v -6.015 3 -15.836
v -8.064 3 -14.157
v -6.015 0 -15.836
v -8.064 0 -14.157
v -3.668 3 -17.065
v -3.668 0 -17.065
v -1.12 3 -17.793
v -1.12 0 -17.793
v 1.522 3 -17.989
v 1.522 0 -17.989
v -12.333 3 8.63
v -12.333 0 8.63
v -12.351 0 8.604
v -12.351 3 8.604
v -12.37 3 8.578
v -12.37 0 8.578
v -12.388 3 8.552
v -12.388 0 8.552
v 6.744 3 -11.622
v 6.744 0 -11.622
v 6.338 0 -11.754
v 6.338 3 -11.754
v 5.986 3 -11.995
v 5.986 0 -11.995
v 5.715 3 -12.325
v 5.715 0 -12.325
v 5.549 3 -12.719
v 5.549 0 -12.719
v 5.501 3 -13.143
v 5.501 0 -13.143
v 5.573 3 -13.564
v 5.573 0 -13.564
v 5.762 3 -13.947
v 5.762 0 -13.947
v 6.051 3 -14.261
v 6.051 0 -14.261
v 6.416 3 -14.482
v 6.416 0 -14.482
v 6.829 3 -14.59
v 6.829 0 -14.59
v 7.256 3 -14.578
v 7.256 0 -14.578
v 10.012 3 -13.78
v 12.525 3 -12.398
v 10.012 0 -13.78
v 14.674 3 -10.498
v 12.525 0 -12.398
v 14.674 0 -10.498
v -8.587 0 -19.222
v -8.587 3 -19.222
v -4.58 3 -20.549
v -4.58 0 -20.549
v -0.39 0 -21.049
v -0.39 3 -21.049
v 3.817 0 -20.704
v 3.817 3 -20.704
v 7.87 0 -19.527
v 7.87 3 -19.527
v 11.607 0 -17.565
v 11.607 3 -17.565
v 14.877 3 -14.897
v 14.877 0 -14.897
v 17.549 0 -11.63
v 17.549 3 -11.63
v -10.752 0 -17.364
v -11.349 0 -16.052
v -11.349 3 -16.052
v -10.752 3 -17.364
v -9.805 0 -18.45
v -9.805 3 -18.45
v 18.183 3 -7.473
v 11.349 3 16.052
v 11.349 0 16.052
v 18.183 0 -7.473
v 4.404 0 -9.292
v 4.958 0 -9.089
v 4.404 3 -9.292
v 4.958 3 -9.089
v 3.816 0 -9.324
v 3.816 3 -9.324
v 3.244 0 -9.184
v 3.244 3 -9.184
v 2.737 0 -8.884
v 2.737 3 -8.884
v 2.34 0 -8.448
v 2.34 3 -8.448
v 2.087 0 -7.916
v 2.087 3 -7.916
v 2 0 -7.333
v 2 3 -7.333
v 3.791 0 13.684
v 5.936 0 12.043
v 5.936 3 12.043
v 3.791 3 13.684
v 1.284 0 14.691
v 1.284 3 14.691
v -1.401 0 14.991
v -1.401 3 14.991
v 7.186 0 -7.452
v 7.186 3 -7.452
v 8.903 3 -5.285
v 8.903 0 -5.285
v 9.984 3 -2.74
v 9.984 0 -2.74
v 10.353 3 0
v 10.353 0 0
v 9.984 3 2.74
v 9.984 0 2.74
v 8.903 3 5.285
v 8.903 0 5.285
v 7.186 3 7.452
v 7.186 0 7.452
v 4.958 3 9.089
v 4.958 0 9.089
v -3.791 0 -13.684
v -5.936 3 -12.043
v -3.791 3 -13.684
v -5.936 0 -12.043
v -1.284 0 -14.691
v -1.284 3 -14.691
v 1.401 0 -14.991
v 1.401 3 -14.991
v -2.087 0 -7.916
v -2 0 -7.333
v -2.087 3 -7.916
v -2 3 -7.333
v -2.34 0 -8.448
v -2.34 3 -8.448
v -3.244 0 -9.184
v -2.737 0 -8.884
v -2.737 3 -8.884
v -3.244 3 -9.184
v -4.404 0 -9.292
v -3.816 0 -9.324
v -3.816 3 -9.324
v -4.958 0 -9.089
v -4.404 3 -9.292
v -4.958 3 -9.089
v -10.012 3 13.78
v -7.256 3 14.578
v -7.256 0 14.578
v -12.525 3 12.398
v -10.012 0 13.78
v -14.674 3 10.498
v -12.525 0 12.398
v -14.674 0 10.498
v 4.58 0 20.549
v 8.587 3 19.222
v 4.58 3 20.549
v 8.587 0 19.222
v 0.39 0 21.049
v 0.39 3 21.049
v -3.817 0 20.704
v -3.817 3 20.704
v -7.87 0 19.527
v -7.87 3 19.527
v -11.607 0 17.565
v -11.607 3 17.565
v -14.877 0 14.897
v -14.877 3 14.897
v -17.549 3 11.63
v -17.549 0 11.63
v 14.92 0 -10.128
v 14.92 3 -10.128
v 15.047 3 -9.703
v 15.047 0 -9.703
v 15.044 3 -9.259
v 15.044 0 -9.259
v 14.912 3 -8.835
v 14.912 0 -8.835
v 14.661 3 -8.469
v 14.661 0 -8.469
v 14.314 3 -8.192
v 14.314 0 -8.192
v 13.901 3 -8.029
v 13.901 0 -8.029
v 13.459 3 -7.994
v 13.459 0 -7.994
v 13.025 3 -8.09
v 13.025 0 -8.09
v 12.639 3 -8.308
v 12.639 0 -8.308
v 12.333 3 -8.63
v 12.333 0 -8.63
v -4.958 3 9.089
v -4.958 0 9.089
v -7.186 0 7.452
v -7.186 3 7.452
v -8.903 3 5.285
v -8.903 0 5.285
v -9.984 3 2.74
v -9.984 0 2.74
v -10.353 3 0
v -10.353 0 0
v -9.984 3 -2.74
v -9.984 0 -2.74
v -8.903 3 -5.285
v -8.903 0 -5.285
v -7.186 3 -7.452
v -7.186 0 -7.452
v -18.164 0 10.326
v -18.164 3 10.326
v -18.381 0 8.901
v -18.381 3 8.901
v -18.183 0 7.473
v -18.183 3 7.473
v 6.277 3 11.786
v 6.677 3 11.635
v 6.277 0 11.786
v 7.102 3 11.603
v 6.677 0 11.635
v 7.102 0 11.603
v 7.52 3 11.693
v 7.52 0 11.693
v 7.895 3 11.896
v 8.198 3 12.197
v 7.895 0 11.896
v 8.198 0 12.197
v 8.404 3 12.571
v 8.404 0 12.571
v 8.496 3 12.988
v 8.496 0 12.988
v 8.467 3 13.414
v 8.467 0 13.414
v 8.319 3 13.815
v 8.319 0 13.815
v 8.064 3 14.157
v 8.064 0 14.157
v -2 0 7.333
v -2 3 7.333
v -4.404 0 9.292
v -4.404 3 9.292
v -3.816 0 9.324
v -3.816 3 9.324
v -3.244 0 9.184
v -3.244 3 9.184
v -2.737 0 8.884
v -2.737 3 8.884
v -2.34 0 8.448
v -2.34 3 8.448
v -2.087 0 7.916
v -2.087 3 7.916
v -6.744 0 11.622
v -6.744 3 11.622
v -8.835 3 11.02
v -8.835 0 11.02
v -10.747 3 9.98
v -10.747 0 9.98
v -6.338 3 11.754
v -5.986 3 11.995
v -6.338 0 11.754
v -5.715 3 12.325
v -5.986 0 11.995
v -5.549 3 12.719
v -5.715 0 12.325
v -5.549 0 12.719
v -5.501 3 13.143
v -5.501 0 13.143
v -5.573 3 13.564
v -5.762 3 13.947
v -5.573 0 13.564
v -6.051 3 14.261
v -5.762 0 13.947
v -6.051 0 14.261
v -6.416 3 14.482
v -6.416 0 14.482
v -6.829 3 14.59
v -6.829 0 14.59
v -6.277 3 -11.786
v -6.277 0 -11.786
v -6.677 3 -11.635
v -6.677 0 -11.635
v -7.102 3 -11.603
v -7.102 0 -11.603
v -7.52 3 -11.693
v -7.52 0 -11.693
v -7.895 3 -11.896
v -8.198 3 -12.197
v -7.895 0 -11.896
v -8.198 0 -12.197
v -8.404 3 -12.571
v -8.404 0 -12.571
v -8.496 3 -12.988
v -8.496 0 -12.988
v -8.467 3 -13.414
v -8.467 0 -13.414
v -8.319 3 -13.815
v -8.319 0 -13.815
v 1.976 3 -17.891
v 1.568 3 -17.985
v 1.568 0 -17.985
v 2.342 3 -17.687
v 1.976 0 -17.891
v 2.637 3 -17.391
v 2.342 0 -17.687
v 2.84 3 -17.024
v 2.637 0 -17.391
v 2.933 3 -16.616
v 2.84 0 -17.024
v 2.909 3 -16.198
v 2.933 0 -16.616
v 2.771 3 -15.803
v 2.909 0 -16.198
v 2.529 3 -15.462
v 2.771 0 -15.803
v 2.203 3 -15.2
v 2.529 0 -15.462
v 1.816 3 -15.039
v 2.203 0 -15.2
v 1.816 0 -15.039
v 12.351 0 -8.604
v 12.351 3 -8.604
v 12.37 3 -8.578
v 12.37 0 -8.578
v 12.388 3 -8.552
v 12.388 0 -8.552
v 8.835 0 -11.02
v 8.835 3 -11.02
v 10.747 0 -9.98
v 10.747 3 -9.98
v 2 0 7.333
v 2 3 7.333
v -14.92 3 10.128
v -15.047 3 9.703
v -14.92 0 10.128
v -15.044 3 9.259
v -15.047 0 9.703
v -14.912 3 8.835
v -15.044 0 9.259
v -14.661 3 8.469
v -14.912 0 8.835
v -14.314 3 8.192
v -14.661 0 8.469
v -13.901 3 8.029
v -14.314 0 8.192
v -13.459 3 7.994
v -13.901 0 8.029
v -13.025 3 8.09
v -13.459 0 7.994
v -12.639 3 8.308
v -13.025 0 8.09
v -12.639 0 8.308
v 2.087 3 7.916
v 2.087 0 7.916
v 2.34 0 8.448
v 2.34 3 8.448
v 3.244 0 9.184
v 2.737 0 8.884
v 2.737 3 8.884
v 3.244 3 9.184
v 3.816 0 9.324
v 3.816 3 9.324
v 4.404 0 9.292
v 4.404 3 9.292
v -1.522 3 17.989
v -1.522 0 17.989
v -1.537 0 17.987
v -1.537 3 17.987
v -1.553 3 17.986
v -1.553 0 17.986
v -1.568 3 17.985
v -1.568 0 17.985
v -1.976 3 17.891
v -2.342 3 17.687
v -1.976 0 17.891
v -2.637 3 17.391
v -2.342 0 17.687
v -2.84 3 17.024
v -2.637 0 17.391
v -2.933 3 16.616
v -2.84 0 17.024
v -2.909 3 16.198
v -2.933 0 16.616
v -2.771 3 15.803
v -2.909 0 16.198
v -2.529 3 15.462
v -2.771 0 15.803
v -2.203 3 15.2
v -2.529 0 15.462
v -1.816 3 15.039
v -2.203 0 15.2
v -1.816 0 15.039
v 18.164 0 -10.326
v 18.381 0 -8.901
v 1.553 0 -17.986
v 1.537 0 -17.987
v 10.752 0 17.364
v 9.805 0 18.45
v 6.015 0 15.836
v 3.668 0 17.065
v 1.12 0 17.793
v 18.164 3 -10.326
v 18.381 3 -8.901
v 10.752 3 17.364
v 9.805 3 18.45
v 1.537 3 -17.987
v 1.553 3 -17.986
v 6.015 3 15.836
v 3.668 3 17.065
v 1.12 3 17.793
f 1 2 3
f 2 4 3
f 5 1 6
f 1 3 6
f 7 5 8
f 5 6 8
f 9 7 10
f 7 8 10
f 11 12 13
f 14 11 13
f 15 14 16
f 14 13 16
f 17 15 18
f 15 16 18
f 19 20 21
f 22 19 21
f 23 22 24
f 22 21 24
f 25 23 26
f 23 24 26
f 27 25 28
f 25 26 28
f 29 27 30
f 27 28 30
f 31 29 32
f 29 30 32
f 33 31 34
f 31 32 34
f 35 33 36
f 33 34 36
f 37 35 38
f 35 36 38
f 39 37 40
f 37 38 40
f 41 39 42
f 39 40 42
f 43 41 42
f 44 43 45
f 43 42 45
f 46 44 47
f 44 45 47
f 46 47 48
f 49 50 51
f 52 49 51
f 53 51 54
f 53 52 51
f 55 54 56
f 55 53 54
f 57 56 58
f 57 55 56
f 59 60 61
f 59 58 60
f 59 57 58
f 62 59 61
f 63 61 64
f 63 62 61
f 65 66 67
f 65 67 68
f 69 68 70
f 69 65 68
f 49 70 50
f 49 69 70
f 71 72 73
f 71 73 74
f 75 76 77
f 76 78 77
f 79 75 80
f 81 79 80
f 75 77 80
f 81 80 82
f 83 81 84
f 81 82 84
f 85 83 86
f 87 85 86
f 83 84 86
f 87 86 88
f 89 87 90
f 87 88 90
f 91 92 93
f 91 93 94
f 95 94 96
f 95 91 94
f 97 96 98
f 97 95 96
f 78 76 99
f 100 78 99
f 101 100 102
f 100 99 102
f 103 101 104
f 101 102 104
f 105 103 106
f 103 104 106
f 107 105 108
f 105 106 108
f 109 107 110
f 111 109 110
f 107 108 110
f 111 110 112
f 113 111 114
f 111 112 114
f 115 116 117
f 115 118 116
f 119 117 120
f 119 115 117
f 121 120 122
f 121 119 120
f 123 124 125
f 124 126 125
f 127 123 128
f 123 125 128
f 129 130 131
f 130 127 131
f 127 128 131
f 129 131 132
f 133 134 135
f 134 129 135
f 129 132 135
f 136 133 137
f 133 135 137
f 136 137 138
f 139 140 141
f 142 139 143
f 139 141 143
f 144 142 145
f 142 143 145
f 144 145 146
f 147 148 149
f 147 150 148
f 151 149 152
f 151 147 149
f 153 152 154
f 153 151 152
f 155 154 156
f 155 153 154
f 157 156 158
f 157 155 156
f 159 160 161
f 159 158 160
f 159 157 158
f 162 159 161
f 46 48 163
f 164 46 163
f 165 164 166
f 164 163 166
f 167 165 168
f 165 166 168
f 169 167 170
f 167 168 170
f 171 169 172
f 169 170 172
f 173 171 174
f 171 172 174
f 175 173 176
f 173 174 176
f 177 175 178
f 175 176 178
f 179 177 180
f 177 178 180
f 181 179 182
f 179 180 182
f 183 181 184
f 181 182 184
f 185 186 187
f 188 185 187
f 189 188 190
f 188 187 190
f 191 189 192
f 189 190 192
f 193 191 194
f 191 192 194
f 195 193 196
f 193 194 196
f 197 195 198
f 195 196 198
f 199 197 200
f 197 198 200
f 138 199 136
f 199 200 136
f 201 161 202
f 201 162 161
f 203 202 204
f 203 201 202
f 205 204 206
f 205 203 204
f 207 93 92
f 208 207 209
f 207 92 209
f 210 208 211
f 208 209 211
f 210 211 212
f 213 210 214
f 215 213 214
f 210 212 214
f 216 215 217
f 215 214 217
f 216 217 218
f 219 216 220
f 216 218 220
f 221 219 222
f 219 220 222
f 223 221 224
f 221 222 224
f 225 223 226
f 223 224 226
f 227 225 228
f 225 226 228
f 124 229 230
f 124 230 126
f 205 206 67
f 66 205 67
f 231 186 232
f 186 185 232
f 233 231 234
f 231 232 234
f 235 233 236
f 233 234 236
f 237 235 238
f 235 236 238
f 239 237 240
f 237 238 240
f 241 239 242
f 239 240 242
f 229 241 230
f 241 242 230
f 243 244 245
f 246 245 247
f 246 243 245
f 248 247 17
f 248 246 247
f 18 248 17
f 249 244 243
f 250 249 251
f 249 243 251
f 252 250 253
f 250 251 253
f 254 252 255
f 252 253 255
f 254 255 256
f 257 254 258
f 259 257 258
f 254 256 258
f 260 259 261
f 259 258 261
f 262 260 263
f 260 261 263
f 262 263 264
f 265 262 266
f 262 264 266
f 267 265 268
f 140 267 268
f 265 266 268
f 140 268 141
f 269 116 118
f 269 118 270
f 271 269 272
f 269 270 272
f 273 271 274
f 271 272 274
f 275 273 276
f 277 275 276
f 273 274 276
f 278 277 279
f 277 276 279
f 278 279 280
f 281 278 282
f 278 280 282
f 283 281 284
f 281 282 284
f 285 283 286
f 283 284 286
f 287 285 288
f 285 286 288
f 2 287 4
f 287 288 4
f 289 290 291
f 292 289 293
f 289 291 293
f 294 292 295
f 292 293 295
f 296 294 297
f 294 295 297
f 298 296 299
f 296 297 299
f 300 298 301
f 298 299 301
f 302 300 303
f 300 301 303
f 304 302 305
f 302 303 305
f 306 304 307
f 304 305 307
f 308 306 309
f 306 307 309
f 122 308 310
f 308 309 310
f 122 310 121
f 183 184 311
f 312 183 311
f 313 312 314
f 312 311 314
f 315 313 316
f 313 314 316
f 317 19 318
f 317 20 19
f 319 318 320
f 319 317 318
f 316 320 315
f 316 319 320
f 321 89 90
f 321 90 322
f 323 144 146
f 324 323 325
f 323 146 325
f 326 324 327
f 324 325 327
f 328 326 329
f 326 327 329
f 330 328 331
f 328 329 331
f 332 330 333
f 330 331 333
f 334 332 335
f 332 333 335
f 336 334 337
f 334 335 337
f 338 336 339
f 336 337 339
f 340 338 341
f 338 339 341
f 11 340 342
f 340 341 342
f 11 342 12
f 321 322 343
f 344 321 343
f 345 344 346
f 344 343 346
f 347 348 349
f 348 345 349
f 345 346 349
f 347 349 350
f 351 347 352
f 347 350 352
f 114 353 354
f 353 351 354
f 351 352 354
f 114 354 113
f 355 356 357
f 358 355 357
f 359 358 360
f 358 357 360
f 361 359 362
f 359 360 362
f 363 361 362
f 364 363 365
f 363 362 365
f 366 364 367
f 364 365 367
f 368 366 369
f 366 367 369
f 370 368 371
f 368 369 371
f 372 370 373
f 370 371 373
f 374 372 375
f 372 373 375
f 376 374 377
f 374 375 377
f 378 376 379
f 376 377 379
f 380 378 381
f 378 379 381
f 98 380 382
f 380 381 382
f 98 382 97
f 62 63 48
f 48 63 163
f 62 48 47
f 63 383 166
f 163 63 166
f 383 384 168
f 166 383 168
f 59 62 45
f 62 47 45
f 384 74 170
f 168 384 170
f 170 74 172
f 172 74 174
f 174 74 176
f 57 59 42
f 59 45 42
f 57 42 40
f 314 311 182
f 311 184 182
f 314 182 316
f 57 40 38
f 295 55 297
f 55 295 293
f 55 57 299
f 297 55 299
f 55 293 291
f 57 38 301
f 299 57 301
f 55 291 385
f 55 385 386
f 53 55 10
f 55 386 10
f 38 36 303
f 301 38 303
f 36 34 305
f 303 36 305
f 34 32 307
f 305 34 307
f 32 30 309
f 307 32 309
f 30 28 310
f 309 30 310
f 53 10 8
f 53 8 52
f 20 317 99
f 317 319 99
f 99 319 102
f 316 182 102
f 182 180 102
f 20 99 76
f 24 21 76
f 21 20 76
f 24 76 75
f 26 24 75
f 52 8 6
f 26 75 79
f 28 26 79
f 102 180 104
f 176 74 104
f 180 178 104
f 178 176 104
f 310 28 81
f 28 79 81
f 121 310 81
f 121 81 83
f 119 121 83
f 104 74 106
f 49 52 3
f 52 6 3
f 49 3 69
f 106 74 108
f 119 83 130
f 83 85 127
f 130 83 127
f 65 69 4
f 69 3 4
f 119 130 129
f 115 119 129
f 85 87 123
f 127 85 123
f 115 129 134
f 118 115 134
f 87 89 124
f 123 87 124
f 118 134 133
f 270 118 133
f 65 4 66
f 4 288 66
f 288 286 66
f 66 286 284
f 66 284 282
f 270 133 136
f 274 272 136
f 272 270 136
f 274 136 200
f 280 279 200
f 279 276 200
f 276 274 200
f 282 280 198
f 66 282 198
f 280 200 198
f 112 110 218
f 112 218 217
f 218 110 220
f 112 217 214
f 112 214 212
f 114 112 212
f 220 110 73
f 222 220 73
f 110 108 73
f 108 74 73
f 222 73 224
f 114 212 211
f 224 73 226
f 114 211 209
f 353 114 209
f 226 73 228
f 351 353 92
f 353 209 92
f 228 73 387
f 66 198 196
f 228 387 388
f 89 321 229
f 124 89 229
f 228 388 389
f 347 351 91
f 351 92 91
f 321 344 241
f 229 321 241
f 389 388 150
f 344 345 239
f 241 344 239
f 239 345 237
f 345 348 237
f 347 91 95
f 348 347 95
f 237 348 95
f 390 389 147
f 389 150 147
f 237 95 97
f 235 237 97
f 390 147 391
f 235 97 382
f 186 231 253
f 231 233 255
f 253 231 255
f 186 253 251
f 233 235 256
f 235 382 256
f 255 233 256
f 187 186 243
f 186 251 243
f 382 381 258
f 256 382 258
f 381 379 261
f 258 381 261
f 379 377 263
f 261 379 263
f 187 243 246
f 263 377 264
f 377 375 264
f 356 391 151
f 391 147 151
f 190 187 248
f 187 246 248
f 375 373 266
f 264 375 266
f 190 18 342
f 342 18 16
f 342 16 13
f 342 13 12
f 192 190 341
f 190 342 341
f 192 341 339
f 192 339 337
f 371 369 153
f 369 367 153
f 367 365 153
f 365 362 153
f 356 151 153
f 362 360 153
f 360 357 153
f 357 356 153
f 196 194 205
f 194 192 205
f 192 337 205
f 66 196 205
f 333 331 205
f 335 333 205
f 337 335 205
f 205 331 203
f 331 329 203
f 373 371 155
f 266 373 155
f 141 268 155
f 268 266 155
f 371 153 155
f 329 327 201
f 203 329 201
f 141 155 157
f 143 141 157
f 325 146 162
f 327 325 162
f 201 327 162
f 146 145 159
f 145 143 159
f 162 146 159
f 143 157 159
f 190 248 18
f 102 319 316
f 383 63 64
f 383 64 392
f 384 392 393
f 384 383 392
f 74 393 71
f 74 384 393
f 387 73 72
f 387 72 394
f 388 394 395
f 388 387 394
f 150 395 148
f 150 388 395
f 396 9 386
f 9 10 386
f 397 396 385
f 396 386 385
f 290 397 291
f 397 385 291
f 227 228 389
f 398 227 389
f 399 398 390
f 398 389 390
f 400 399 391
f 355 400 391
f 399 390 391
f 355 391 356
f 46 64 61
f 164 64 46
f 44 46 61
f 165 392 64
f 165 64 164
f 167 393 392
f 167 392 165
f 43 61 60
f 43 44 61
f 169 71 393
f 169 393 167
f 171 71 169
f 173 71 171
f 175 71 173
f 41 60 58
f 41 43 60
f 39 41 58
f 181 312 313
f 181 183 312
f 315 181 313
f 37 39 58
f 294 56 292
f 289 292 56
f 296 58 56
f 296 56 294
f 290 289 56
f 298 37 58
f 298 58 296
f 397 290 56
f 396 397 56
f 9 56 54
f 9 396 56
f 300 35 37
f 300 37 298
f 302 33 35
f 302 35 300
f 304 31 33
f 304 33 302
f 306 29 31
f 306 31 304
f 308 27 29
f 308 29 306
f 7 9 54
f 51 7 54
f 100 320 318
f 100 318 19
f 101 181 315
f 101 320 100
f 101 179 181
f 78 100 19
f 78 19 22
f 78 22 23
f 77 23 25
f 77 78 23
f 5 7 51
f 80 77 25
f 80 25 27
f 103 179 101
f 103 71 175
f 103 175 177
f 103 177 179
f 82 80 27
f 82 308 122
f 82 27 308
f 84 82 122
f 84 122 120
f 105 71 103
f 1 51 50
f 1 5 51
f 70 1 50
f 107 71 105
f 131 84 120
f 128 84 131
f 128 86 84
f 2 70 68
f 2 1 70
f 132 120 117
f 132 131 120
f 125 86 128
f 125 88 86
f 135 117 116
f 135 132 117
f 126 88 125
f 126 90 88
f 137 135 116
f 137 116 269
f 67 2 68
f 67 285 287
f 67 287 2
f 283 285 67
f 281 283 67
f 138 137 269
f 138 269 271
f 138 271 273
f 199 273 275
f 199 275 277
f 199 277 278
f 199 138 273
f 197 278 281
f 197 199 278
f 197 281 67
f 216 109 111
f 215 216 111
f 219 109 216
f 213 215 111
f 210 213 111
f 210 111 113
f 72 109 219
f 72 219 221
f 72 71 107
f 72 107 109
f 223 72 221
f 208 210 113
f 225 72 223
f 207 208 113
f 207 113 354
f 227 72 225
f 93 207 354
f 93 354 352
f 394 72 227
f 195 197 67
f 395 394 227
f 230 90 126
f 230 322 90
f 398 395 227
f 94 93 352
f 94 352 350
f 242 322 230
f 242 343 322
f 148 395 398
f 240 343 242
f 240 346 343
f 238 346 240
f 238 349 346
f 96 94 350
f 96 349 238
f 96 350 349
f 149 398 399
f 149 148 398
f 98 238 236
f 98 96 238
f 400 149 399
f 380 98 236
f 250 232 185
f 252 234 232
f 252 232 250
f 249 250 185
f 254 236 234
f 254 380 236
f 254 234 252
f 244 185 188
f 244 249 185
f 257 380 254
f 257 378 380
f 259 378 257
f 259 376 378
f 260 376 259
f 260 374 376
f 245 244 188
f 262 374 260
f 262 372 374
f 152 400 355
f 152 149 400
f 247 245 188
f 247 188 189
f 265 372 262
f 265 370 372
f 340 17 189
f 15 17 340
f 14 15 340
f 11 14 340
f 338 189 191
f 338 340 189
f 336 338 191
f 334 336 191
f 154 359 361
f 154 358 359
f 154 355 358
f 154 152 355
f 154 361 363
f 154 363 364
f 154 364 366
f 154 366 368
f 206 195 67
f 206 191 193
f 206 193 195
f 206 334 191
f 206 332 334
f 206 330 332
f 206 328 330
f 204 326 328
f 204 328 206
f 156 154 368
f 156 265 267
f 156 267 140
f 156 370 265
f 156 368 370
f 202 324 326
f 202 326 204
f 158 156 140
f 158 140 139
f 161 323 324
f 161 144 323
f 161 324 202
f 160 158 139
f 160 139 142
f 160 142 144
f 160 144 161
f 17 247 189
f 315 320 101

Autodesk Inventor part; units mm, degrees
ref_plane "YZ Plane" through (0, 0, 0) normal (1, 0, 0) x (0, 1, 0)
ref_plane "XZ Plane" through (0, 0, 0) normal (0, 1, 0) x (-1, 0, 0)
ref_plane "XY Plane" through (0, 0, 0) normal (0, 0, 1) x (1, 0, 0)
sketch "Эскиз1" plane through (0, 0, 0) normal (0, 1, 0) x (-1, 0, 0)
  line L0 (-7, 13.1) -> (7, 13.1) construction
  line L1 (7, 13.1) -> (7, -13.1) construction
  line L2 (7, -13.1) -> (-7, -13.1) construction
  line L3 (-7, -13.1) -> (-7, 13.1) construction
  line L4 (-7, 13.1) -> (7, -13.1) construction
  line L5 (7, 13.1) -> (-7, -13.1) construction
  line L6 (-1.437822, -16.490381) -> (13.562178, 9.490381) construction
  line L7 (13.562178, 9.490381) -> (1.437822, 16.490381) construction
  line L8 (1.437822, 16.490381) -> (-13.562178, -9.490381) construction
  line L9 (-13.562178, -9.490381) -> (-1.437822, -16.490381) construction
  line L10 (-1.437822, -16.490381) -> (1.437822, 16.490381) construction
  line L11 (13.562178, 9.490381) -> (-13.562178, -9.490381) construction
  circle A0 centre (13.562178, 9.490381) radius 1.5
  circle A1 centre (1.437822, 16.490381) radius 1.5
  circle A2 centre (7, 13.1) radius 1.5
  circle A3 centre (-7, 13.1) radius 1.5
  circle A4 centre (-7, -13.1) radius 1.5
  circle A5 centre (7, -13.1) radius 1.5
  circle A6 centre (-1.437822, -16.490381) radius 1.5
  circle A7 centre (-13.562178, -9.490381) radius 1.5
  circle A8 centre (0, 0) radius 13.352946
  circle A9 centre (0, 0) radius 15.052945
  circle A10 centre (0, 0) radius 18.052945
  circle A11 centre (0, 0) radius 16.352946
  circle A12 centre (0, 0) radius 21.052945
  circle A13 centre (0, 0) radius 10.352946
  line L12 (-2, 10.352946) -> (2, 10.352946) construction
  line L13 (2, 10.352946) -> (2, -10.352946)
  line L14 (2, -10.352946) -> (-2, -10.352946) construction
  line L15 (-2, -10.352946) -> (-2, 10.352946)
  line L16 (-2, 10.352946) -> (2, -10.352946) construction
  line L17 (2, 10.352946) -> (-2, -10.352946) construction
  circle A14 centre (1.157182, 4.993806) radius 10
  circle A15 centre (1.157182, 4.993806) radius 13
  circle A16 centre (5.040606, 1.768152) radius 10
  circle A17 centre (5.040606, 1.768152) radius 13
  circle A18 centre (-1.157182, -4.993806) radius 10
  circle A19 centre (-1.157182, -4.993806) radius 13
  circle A20 centre (-5.040606, -1.768152) radius 10
  circle A21 centre (-5.040606, -1.768152) radius 13
  point P0 (6.29307, 11.77703)
  point P1 (1.307529, 14.996051)
  point P2 (-1.307529, -14.996051)
  point P3 (-6.29307, -11.77703)
  point P4 (-7.70693, -14.42297)
  point P5 (-6.29307, 11.77703)
  point P6 (-7.70693, 14.42297)
  point P7 (14.79116, 10.350383)
  point P8 (12.333196, 8.630379)
  point P9 (6.29307, -11.77703)
  point P10 (7.70693, -14.42297)
  point P11 (-14.79116, -10.350383)
  point P12 (-12.333196, -8.630379)
  point P13 (-2, 10.157927)
  point P14 (-2, -10.157927)
  point P15 (2, -10.157927)
  point P16 (2, 10.157927)
  point P17 (8.377519, -12.506332)
  point P18 (-14.189914, -8.128049)
  point P19 (14.189914, 8.128049)
  point P20 (-8.377519, 12.506332)
  point P21 (7.255573, 14.578067)
  point P22 (14.673687, 10.497628)
  point P23 (12.387672, 8.552003)
  point P24 (6.744427, 11.621933)
  point P25 (6.398093, -8.139281)
  point P26 (6.282627, -8.154417)
  point P27 (6.207779, -8.285346)
  point P28 (8.06398, -14.15733)
  point P29 (-1.474427, -17.989934)
  point P30 (-1.354811, -14.991853)
  point P31 (5.93602, -12.04267)
  point P32 (-7.255573, -14.578067)
  point P33 (-14.673687, -10.497628)
  point P34 (-12.387672, -8.552003)
  point P35 (-6.744427, -11.621933)
  point P36 (1.354811, 14.991853)
  point P37 (-5.93602, 12.04267)
  point P38 (-8.06398, 14.15733)
  point P39 (1.474427, 17.989934)
  dimension "d6" = 3
  dimension "d7" = 3
  dimension "d11" = 3
  dimension "d0" = 14
  dimension "d1" = 26.2
  dimension "d2" = 30
  dimension "d3" = 14
  dimension "d5" = 3
  dimension "d8" = 3
  dimension "d9" = 3
  dimension "d10" = 3
  dimension "d12" = 3
  dimension "d15" = 3
  dimension "d16" = 3
  dimension "d19" = 3
  dimension "d22" = 3
  dimension "d23" = 4
  dimension "d26" = 30
  dimension "d28" = 20
  dimension "d29" = 3
  dimension "d30" = 20
  dimension "d31" = 3
  dimension "d32" = 20
  dimension "d33" = 3
  dimension "d34" = 20
  dimension "d35" = 3
extrude "Выдавливание1" add sketch "Эскиз1" along normal blind 3 contours A0 A10 A17 A11 | A10 A17 | A0 A17 A10 | A11 A17 A9 A16 A15 A0 | A17 A15 A10 | A10 A6 A19 A11 A17 | A15 A16 A0 | A17 A11 A1 A10 A15 | A11 A19 A9 A17 | A10 A1 A15 | A16 A9 A0 | A16 A15 A9 | A16 A9 A15 | A17 A14 A1 A11 | A19 A10 A6 | A17 A19 A8 A16 A9 | A9 A19 A17 | A1 A15 A11 A21 A10 | A9 A15 A8 A14 A16 | A9 A16 A8 A15 | A2 A9 A14 A17 | A10 A19 A21 A11 A6 | A10 A21 A19 | A5 A9 A19 | A9 A5 A8 A17 A19 | A17 A8 A19 | A21 A11 A7 A10 | A10 A21 | A14 A8 A16 | A14 A17 A9 A1 | A2 A14 A9 | A14 A9 A17 | A11 A21 A18 A6 | A10 A7 A21 | A5 A18 A8 | A17 A18 A16 A19 A8 | A8 A18 A17 | A19 A16 A8 | A15 A9 A21 A11 | A21 A9 A20 A19 A7 A11 | A8 A16 A13 A21 A17 | A14 A19 A13 A16 A8 | A8 A15 A19 A14 | A16 A8 A2 | A16 A19 A15 A8 | A9 A17 A8 A14 | A2 A8 A17 A9 A14 | A18 A21 A9 A6 | A18 A9 A21 A8 | A18 A8 A21 A17 | A17 A21 A13 A16 A18 | A16 A18 A15 A19 | A3 A9 A15 | A21 A15 A8 A20 A9 | A9 A15 A21 | A15 A18 A13 A14 A19 | A8 A14 A21 | A8 A21 A15 A9 A3 | A14 A8 A3 | A17 A21 A14 A8 | A21 A4 A9 A18 | A18 A9 A21 | A8 A21 A9 A18 A4 | A21 A8 A20 A13 A17 | A17 A13 A21 | A16 A13 A15 A18 | A19 A20 A7 | A20 A8 A19 A9 | A9 A19 A20 | A21 A8 A15 | A16 A21 A13 | A13 L13 A21 A16 | A14 A13 A19 | A15 A13 A18 | A21 A13 A17 | A17 A13 A20 A14 A21 | A9 A4 A18 | A17 A20 L13 A13 | A13 A20 A17 | A20 A9 A7 | A20 A19 A9 | A19 A8 A18 A20 A9 | A20 A15 A19 A8 | A8 A15 A20 | A8 A21 A14 A20 A15 | A21 A16 L15 A13 | A21 L13 A19 L15 A16 | A4 A20 A8 | A20 A8 A18 A15 A13 | A13 L15 A17 A20 | A17 L15 A15 L13 A20 | A19 A15 A18 A8 | A20 A14 A19 A15 | A20 A13 A19 A14 | A20 A18 A8 | A19 A14 A13 A18 A15 | L13 A20 L15 A19 | A19 A13 A14 | A15 A18 A13 | A15 L15 A16 L13 | L13 A18 L15 A20 | A16 L15 A14 L13 | L13 A14 L15 A18 | A12 picked at (5.651458, 13.934035) picked at (-0.217232, 10.33749) picked at (-5.651458, -13.934035) picked at (0.217232, -10.33749)
fillet "Сопряжение1" radius 2 4 edges at (-2, 1.5, -10.1579) (-2, 1.5, 10.1579) (2, 1.5, 10.1579) (2, 1.5, -10.1579)
sketch "Эскиз2" plane through (0, 3, 0) normal (0, 1, 0) x (1, 0, 0)
  line L0 (-18.777493, -9.520098) -> (-10.754619, 18.098748)
  circle A0 centre (0, 0) radius 21.052945
  line L1 (10.754619, -18.098748) -> (18.777493, 9.520098)
  line L2 (0, 0) -> (0, 4.178964)
  line L3 (-18.777493, -9.520098) -> (10.754619, -18.098748) construction
  arc A1 (-12.333196, -8.630379) -> (-14.673687, -10.497628) centre (-13.562178, -9.490381) ccw
  arc A2 (-8.06398, 14.15733) -> (-5.93602, 12.04267) centre (-7, 13.1) ccw
  dimension "d38" = 5
  dimension "d40" = 5
extrude "Выдавливание2" cut sketch "Эскиз2" against normal blind 3 contours A0 L0 | L1 A0
fillet "Сопряжение2" radius 5 4 edges at (-18.7775, 1.5, 9.5201) (-10.7546, 1.5, -18.0987) (18.7775, 1.5, -9.5201) (10.7546, 1.5, 18.0987)
properties part number "krepezh"
